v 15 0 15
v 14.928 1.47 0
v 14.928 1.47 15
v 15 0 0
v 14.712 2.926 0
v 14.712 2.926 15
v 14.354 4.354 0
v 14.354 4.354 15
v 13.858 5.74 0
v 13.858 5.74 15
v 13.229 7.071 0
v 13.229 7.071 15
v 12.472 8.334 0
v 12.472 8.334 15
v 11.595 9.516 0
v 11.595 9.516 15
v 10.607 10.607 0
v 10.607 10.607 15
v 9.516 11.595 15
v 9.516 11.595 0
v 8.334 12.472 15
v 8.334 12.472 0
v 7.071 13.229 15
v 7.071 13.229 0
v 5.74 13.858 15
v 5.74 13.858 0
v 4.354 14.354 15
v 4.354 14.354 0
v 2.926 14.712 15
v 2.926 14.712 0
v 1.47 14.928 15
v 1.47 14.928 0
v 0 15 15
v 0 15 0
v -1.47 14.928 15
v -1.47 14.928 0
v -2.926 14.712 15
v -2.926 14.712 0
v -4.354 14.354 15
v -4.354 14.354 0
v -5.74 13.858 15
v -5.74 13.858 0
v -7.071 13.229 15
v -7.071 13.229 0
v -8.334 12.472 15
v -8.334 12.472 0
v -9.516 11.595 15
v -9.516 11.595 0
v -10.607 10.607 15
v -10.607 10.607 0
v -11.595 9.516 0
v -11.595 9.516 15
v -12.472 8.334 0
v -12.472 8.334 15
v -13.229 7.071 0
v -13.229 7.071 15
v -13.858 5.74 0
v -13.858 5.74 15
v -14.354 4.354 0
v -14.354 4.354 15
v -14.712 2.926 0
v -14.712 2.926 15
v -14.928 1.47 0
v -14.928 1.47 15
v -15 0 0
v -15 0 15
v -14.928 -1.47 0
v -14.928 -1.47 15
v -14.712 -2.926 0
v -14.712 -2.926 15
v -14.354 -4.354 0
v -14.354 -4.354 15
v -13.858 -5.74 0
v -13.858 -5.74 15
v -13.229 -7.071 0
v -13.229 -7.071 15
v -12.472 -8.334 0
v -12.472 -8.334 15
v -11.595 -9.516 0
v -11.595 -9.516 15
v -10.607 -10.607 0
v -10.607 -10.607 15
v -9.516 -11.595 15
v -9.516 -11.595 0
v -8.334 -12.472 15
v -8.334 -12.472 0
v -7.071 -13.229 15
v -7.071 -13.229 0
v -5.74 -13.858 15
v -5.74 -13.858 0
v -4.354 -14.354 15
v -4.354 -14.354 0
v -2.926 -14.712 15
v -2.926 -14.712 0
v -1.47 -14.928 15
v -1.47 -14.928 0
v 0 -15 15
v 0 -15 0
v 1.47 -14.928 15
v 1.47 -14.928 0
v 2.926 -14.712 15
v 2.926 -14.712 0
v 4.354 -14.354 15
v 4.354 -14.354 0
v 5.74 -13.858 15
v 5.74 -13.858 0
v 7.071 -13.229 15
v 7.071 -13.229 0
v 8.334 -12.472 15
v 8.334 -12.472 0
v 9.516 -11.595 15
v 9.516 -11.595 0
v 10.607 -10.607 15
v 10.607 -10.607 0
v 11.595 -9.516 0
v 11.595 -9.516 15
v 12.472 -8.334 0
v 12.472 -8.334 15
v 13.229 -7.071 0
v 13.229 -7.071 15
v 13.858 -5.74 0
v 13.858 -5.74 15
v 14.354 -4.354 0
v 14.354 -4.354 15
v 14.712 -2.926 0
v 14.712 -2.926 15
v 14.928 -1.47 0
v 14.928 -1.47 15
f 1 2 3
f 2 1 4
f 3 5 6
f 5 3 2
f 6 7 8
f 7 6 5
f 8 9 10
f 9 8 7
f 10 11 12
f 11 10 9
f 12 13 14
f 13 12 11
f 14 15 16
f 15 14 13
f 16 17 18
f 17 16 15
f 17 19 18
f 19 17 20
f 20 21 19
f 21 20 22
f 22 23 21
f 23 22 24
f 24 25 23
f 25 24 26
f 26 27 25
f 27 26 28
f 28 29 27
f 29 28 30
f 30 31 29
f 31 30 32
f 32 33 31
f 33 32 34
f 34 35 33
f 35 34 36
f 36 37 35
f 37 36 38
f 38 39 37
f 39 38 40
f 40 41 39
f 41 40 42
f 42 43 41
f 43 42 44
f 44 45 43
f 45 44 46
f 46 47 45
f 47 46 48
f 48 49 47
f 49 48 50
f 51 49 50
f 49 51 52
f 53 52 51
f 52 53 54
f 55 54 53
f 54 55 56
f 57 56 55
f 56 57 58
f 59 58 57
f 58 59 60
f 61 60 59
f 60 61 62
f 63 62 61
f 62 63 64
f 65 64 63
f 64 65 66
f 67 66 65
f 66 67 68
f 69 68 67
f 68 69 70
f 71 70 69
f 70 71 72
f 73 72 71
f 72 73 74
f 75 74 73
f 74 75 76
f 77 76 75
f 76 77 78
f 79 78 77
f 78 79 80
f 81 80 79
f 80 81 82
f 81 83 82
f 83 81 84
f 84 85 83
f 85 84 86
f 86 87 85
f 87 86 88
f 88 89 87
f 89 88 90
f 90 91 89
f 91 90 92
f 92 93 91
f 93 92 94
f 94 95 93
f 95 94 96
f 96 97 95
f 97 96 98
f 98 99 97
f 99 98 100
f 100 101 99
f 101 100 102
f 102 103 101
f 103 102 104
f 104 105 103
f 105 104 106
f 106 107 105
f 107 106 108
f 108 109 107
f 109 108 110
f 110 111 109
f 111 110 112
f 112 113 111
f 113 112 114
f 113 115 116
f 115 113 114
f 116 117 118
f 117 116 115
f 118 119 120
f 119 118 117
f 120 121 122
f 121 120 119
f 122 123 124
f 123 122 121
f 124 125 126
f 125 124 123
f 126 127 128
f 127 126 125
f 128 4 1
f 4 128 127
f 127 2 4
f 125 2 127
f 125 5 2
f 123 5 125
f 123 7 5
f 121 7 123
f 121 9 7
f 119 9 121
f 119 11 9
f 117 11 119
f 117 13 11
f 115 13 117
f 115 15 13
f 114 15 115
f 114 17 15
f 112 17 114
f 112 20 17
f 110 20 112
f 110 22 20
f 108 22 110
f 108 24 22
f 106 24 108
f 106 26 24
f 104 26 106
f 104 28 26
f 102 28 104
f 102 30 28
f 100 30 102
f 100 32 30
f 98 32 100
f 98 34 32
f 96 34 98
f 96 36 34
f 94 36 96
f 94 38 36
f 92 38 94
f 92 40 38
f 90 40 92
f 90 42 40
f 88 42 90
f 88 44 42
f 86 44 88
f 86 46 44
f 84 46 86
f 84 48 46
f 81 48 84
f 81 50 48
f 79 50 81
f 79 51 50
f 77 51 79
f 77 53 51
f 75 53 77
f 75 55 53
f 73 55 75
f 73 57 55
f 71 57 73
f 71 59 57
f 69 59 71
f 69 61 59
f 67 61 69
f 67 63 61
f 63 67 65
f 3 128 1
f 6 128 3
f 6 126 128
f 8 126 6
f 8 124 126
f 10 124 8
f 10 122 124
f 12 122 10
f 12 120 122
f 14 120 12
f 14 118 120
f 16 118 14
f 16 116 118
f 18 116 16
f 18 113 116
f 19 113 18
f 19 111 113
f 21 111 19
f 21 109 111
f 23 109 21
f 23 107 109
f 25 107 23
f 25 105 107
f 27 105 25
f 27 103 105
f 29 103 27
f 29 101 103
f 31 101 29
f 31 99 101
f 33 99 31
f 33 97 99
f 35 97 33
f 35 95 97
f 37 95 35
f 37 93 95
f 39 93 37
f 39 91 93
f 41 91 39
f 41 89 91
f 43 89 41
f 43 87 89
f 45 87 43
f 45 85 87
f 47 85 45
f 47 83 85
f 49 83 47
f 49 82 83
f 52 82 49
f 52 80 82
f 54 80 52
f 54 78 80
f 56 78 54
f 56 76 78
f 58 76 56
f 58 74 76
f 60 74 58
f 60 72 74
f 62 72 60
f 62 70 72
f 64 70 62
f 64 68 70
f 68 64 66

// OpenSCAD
// Dimensions
$fn = 64;

// Knob overall dimensions
knob_diameter = 30;
knob_height = 15;

// D-shaft bore dimensions
d_shaft_diameter = 6.2;
d_shaft_flat_width = 4.7;
d_shaft_depth = 12;

// Groove dimensions
groove_diameter = 2;
groove_count = 18;
groove_depth = knob_height; // full height

// Pointer groove
pointer_width = 1.5;
pointer_depth = 1;

// Create base knob cylinder: centered on origin, bottom at z=0
// Use center=false so bottom is at z=0
cylinder(h = knob_height, d = knob_diameter, center = false);

// Cut D-shaped blind bore: 12 mm deep, from z=0 to z=12
// The D-shape has a flat side of 4.7 mm, and a circle of diameter 6.2 mm
// So the circle has radius 3.1 mm
// The flat side is 4.7 mm, so the chord length is 4.7 mm
// The angle θ from center to each end of the flat side: θ = asin( (4.7/2) / 3.1 ) = asin(2.35 / 3.1) ≈ 50.3°
// So the D-shape spans from -50.3° to +50.3° on the bottom, and the rest is a semicircle

// Define the D-shape polygon: start at the left end of the flat side, go along the flat, then follow the arc to the right end
// The flat side is at the bottom, so the flat side is from (-2.35, -3.1) to (2.35, -3.1), but these points are not on the circle

// Correct: the flat side is a straight line of length 4.7 mm, and the curved side is a circle of radius 3.1 mm
// The two endpoints of the flat side are at angle θ = -90° ± 50.3° from the vertical? No.

// Actually, the D-shape has the flat side on one side, so the flat side is vertical? No, the D-shaft has the flat side on one side, so the flat side is on the side of the shaft

// The D-shaft has a flat side of 4.7 mm, so the diameter is 6.2 mm, so the radius is 3.1 mm
// The flat side is 4.7 mm, so the two points on the circle are at angle θ from the center, where the chord length is 4.7 mm
// The angle between the two radii to the endpoints of the flat side is: θ = 2 * asin( (4.7/2) / 3.1 ) = 2 * asin(2.35 / 3.1) ≈ 2 * 50.3° = 100.6°
// So the D-shape is a circle of radius 3.1 mm, with a chord of 4.7 mm, spanning an angle of 100.6°

// But the flat side is on the side, so the chord is on the side, so the D-shape is a circle with a flat side on the side

// We'll define the D-shape as a polygon: start at the bottom of the circle (0, -3.1), go to the left end of the flat side, then follow the arc to the right end of the flat side, then back to the bottom

// Actually, the D-shape has a flat side of 4.7 mm, so the two endpoints are at angle -50.3° and +50.3° from the vertical? No.

// Let's define the D-shape: the flat side is 4.7 mm, so the two points are at:
// - x = 3.1 * sin(θ), y = -3.1 * cos(θ), where θ is from the negative y-axis
// - The chord length between two points at angles θ1 and θ2 is 2 * 3.1 * sin( (θ2 - θ1)/2 )
// - We want chord length = 4.7 mm, so 2 * 3.1 * sin(Δθ/2) = 4.7 → sin(Δθ/2) = 4.7 / (2*3.1) = 4.7 / 6.2 = 0.758 → Δθ/2 = asin(0.758) ≈ 49.5° → Δθ ≈ 99.0°

// So the D-shape spans an angle of 99.0° on one side, and the flat side is 4.7 mm

// But for simplicity, we can define the D-shape as a polygon with:
// - Start at (0, -3.1) — bottom of the circle
// - Go to (2.35, -3.1) — right end of flat side
// - Then follow the arc of the circle from angle 0° to 180° to 360°? No.

// Actually, the D-shape has a flat side of 4.7 mm, so the two endpoints are at:
// - (3.1 * sin(α), -3.1 * cos(α)) and (3.1 * sin(α), -3.1 * cos(α)) with α = 49.5°? No.

// Let's do it numerically:
// The two points on the circle are at angles θ and -θ from the vertical, where the chord length is 2 * 3.1 * sin(θ) = 4.7 → sin(θ) = 4.7 / (2*3.1) = 0.758 → θ = asin(0.758) ≈ 49.5°
// So the two points are at angles 90° - 49.5° = 40.5° and 90° + 49.5° = 139.5° from the positive x-axis? No.

// Let's define the circle centered at (0,0). The flat side is on the bottom, so the two endpoints are at angles:
// - θ1 = 180° - 49.5° = 130.5° from positive x-axis
// - θ2 = 180° + 49.5° = 229.5° from positive x-axis
// But that would be on the left and right.

// Actually, the flat side is on the bottom, so the two endpoints are at angles:
// - θ = 90° + 49.5° = 139.5° and θ = 90° - 49.5° = 40.5° from positive x-axis? No.

// Let's define: the flat side is horizontal, so the two endpoints are at angles θ and -θ from the negative y-axis.

// The negative y-axis is 270° from positive x-axis.
// So the two points are at 270° - 49.5° = 220.5° and 270° + 49.5° = 319.5° from positive x-axis.

// So the D-shape polygon: start at (3.1 * cos(220.5°), 3.1 * sin(220.5°)) = (3.1 * cos(220.5), 3.1 * sin(220.5))
// But we want the flat side to be on the bottom, so the flat side is from (x1, y1) to (x2, y2), where y1 = y2 = -3.1 * cos(49.5°) ≈ -3.1 * 0.65 = -2.015, and x1 = -3.1 * sin(49.5°) ≈ -3.1 * 0.76 = -2.356, x2 = 3.1 * sin(49.5°) ≈ 2.356

// So the two points are at (-2.356, -2.015) and (2.356, -2.015), and the rest of the circle is from (2.356, -2.015) to (-2.356, -2.015) through the top (0,3.1)

// But that would be a semicircle of radius 3.1 mm, but the points are not at the bottom.

// The distance from center to each point: sqrt(2.356^2 + (-2.015)^2) = sqrt(5.55 + 4.06) = sqrt(9.61) = 3.1 —
